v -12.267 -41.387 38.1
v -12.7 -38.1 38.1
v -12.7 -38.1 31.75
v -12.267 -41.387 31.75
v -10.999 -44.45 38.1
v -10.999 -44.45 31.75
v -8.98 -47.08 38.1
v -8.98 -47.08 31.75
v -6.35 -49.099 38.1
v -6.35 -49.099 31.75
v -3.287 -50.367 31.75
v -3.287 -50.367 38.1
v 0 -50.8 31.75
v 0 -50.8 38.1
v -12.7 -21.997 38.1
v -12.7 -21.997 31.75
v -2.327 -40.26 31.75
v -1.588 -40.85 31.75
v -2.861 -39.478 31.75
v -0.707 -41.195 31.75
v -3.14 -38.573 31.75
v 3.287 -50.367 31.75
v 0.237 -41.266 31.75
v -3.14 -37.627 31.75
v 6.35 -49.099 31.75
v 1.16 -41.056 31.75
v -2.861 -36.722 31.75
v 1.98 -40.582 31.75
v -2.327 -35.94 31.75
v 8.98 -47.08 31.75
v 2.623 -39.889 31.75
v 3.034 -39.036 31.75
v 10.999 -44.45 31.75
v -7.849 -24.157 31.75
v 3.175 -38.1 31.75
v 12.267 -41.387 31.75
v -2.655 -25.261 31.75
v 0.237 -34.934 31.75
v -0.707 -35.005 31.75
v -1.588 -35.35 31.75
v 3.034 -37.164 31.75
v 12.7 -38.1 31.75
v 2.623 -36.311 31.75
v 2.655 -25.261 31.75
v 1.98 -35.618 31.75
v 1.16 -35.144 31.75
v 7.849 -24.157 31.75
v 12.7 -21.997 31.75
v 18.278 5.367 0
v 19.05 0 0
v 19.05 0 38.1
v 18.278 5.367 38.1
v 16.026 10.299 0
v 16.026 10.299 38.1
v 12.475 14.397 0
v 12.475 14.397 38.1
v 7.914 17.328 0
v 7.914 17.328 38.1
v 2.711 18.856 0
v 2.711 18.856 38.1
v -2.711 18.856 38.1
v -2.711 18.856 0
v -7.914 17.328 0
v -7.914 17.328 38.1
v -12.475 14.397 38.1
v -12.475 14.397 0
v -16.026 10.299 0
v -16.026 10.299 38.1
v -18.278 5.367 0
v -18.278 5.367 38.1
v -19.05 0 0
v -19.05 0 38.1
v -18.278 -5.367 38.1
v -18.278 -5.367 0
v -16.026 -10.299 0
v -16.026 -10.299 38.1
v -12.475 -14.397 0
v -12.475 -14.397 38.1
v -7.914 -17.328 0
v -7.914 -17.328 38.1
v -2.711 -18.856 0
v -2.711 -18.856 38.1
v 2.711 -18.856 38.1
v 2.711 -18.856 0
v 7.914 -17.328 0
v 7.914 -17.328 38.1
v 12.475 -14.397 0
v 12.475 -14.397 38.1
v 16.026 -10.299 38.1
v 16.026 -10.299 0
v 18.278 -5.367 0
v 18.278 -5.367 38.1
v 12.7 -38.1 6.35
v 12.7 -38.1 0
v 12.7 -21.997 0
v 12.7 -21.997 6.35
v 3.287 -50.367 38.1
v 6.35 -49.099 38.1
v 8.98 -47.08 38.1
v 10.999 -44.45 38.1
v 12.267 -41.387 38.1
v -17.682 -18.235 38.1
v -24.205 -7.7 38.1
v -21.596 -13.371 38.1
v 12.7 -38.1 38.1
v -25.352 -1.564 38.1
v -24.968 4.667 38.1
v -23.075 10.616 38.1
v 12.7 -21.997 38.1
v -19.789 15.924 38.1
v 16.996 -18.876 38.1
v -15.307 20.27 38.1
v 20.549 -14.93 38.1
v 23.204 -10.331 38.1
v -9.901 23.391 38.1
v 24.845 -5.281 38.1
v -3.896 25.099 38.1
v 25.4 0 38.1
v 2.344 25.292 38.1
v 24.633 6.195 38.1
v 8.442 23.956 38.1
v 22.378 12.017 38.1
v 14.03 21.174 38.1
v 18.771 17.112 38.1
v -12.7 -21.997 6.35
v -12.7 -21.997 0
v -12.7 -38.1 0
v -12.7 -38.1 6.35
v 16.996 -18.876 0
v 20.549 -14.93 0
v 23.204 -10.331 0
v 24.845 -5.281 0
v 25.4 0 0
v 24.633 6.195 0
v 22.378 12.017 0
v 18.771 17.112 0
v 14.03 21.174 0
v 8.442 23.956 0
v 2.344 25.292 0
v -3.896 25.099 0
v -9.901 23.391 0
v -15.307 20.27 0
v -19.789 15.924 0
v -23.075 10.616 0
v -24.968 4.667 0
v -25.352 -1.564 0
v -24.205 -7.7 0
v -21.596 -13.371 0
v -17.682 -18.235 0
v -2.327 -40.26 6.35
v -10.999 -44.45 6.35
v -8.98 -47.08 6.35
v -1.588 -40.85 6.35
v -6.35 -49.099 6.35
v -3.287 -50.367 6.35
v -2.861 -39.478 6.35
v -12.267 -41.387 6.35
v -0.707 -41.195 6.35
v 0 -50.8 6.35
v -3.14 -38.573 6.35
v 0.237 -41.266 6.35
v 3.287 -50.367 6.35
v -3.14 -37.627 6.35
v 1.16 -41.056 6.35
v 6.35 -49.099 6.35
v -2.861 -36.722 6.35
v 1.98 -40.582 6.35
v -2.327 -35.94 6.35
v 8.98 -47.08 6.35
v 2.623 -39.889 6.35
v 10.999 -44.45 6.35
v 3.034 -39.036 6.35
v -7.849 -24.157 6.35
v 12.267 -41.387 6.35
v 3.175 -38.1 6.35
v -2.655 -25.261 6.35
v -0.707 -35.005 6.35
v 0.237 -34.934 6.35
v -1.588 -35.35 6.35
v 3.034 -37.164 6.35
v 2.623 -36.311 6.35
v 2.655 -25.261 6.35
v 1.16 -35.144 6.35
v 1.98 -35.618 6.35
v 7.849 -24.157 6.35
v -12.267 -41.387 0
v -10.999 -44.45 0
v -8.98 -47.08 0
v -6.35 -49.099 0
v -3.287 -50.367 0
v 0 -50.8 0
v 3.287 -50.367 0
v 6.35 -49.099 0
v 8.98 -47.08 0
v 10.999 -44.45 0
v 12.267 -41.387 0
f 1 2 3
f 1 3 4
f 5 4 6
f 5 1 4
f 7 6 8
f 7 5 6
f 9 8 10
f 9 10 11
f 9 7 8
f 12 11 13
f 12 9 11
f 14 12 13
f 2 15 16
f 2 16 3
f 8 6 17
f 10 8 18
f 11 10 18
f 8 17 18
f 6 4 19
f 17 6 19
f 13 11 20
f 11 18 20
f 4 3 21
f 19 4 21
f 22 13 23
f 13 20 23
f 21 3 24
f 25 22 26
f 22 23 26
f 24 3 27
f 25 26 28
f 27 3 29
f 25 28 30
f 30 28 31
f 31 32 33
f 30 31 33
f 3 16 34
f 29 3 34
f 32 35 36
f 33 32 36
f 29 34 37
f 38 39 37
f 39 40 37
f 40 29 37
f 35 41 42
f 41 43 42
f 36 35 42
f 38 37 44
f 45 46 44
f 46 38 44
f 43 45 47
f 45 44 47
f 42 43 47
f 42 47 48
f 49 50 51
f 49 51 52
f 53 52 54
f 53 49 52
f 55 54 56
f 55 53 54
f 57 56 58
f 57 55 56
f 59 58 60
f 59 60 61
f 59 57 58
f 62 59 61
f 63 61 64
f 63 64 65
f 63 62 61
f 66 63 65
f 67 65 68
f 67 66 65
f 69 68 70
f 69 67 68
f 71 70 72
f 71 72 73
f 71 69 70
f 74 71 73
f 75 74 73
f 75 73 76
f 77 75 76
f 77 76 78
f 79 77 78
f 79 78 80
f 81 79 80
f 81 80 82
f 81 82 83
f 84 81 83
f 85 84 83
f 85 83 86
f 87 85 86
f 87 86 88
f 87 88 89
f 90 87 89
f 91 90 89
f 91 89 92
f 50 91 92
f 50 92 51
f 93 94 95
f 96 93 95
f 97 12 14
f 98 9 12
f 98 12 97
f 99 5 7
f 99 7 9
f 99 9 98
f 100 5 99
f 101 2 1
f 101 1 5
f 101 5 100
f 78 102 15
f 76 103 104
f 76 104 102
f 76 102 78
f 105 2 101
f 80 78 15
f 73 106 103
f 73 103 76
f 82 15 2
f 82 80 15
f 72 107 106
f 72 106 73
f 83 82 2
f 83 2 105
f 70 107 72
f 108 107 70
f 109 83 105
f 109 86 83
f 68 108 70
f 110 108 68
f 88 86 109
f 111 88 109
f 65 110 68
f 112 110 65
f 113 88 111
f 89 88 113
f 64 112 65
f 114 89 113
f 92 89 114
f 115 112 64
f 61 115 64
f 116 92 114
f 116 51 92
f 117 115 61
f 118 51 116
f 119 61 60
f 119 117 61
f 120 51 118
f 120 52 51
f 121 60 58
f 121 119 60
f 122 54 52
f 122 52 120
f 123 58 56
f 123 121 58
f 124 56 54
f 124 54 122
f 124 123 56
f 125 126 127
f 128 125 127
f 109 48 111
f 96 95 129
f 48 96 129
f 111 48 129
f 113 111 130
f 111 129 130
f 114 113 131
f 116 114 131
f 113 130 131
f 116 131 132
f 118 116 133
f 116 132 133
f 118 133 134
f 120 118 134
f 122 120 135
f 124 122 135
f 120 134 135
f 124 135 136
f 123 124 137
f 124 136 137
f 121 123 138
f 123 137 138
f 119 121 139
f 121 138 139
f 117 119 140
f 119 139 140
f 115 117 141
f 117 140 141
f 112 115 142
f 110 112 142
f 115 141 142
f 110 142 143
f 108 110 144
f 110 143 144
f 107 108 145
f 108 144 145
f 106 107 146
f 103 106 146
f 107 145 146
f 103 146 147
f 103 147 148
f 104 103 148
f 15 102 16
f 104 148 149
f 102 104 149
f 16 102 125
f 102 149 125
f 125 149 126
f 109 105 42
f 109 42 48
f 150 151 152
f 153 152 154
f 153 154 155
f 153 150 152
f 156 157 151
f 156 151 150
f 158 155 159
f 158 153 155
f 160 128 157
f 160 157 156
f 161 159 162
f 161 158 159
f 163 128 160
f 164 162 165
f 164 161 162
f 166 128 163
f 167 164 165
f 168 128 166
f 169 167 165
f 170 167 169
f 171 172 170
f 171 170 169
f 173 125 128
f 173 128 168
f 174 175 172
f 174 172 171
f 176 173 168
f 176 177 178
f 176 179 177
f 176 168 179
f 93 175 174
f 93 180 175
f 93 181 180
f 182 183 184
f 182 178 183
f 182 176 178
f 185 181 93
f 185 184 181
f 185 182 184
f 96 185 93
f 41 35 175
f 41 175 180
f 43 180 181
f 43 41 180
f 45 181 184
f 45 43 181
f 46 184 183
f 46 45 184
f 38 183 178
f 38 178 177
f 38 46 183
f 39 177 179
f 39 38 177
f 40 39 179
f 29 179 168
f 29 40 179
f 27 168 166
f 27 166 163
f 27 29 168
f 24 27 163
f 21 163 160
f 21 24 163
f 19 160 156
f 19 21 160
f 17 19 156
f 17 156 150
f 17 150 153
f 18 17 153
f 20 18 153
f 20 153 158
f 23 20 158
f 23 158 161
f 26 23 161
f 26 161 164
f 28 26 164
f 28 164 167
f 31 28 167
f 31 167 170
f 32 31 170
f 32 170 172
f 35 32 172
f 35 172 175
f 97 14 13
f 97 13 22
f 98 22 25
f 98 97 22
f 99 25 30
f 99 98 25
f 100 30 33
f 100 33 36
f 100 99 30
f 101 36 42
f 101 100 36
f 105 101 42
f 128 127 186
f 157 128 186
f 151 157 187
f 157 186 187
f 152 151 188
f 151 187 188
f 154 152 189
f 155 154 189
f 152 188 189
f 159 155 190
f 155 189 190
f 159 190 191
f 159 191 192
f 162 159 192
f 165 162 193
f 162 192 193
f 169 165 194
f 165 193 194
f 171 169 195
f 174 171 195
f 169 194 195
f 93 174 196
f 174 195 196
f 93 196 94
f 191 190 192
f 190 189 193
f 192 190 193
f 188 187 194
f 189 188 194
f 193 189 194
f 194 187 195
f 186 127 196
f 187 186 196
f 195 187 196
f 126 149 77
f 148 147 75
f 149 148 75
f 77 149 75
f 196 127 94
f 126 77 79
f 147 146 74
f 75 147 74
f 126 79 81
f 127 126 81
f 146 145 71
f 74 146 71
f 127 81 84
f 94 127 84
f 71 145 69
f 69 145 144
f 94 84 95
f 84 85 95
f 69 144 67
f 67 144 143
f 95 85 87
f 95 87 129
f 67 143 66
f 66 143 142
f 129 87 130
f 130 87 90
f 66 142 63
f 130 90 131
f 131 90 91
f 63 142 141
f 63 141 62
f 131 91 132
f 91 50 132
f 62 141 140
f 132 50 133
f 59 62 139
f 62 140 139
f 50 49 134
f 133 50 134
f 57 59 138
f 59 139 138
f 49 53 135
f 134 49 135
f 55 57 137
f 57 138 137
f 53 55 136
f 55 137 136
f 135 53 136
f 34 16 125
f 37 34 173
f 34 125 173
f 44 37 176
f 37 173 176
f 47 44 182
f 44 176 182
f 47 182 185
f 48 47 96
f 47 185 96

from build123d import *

# Parameters (mm, degrees)
F0_R     = 19.05
F1_DEPTH = 38.1
F2_DEPTH = 6.35
F4_R     = 3.175
F5_DEPTH = 6.35
F6_DEPTH = 38.1


with BuildPart() as f1:
    # F0 (on Top) → F1 (new body)
    with BuildSketch(Plane.XY):
        with BuildLine():
            ThreePointArc((12.7, -21.997045), (21.997045, -12.7), (25.4, 0))
            ThreePointArc((25.4, 0), (-12.7, 21.997045), (-12.7, -21.997045))
            ThreePointArc((-12.7, -21.997045), (0, -25.4), (12.7, -21.997045))
        make_face()
        Circle(F0_R, mode=Mode.SUBTRACT)
    extrude(amount=F1_DEPTH)

    # F0 (on Top) → F2 (join)
    with BuildSketch(Plane.XY):
        with BuildLine():
            ThreePointArc((12.7, -21.997045), (21.997045, -12.7), (25.4, 0))
            ThreePointArc((25.4, 0), (-12.7, 21.997045), (-12.7, -21.997045))
            ThreePointArc((-12.7, -21.997045), (0, -25.4), (12.7, -21.997045))
        make_face()
        Circle(F0_R, mode=Mode.SUBTRACT)
        with BuildLine():
            ThreePointArc((12.7, -21.997045), (0, -25.4), (-12.7, -21.997045))
            Line((-12.7, -21.997045), (-12.7, -38.1))
            ThreePointArc((-12.7, -38.1), (-8.980256, -47.080256), (0, -50.8))
            ThreePointArc((0, -50.8), (8.980256, -47.080256), (12.7, -38.1))
            Line((12.7, -38.1), (12.7, -21.997045))
        make_face()
    extrude(amount=F2_DEPTH)

    # F4 (on offset) → F5 (join)
    with BuildSketch(Plane.XY.offset(38.1)):
        with BuildLine():
            ThreePointArc((12.7, -21.997045), (0, -25.4), (-12.7, -21.997045))
            Line((-12.7, -21.997045), (-12.7, -38.1))
            ThreePointArc((-12.7, -38.1), (-8.980256, -47.080256), (0, -50.8))
            ThreePointArc((0, -50.8), (8.980256, -47.080256), (12.7, -38.1))
            Line((12.7, -38.1), (12.7, -21.997045))
        make_face()
        with Locations((0, -38.1)):
            Circle(F4_R, mode=Mode.SUBTRACT)
        with Locations((0, -38.1)):
            Circle(F4_R)
    extrude(amount=-F5_DEPTH)

    # F4 (on offset) → F6 (join)
    with BuildSketch(Plane.XY.offset(38.1)):
        with Locations((0, -38.1)):
            Circle(F4_R)
    extrude(amount=-F6_DEPTH)


solid = f1.part
